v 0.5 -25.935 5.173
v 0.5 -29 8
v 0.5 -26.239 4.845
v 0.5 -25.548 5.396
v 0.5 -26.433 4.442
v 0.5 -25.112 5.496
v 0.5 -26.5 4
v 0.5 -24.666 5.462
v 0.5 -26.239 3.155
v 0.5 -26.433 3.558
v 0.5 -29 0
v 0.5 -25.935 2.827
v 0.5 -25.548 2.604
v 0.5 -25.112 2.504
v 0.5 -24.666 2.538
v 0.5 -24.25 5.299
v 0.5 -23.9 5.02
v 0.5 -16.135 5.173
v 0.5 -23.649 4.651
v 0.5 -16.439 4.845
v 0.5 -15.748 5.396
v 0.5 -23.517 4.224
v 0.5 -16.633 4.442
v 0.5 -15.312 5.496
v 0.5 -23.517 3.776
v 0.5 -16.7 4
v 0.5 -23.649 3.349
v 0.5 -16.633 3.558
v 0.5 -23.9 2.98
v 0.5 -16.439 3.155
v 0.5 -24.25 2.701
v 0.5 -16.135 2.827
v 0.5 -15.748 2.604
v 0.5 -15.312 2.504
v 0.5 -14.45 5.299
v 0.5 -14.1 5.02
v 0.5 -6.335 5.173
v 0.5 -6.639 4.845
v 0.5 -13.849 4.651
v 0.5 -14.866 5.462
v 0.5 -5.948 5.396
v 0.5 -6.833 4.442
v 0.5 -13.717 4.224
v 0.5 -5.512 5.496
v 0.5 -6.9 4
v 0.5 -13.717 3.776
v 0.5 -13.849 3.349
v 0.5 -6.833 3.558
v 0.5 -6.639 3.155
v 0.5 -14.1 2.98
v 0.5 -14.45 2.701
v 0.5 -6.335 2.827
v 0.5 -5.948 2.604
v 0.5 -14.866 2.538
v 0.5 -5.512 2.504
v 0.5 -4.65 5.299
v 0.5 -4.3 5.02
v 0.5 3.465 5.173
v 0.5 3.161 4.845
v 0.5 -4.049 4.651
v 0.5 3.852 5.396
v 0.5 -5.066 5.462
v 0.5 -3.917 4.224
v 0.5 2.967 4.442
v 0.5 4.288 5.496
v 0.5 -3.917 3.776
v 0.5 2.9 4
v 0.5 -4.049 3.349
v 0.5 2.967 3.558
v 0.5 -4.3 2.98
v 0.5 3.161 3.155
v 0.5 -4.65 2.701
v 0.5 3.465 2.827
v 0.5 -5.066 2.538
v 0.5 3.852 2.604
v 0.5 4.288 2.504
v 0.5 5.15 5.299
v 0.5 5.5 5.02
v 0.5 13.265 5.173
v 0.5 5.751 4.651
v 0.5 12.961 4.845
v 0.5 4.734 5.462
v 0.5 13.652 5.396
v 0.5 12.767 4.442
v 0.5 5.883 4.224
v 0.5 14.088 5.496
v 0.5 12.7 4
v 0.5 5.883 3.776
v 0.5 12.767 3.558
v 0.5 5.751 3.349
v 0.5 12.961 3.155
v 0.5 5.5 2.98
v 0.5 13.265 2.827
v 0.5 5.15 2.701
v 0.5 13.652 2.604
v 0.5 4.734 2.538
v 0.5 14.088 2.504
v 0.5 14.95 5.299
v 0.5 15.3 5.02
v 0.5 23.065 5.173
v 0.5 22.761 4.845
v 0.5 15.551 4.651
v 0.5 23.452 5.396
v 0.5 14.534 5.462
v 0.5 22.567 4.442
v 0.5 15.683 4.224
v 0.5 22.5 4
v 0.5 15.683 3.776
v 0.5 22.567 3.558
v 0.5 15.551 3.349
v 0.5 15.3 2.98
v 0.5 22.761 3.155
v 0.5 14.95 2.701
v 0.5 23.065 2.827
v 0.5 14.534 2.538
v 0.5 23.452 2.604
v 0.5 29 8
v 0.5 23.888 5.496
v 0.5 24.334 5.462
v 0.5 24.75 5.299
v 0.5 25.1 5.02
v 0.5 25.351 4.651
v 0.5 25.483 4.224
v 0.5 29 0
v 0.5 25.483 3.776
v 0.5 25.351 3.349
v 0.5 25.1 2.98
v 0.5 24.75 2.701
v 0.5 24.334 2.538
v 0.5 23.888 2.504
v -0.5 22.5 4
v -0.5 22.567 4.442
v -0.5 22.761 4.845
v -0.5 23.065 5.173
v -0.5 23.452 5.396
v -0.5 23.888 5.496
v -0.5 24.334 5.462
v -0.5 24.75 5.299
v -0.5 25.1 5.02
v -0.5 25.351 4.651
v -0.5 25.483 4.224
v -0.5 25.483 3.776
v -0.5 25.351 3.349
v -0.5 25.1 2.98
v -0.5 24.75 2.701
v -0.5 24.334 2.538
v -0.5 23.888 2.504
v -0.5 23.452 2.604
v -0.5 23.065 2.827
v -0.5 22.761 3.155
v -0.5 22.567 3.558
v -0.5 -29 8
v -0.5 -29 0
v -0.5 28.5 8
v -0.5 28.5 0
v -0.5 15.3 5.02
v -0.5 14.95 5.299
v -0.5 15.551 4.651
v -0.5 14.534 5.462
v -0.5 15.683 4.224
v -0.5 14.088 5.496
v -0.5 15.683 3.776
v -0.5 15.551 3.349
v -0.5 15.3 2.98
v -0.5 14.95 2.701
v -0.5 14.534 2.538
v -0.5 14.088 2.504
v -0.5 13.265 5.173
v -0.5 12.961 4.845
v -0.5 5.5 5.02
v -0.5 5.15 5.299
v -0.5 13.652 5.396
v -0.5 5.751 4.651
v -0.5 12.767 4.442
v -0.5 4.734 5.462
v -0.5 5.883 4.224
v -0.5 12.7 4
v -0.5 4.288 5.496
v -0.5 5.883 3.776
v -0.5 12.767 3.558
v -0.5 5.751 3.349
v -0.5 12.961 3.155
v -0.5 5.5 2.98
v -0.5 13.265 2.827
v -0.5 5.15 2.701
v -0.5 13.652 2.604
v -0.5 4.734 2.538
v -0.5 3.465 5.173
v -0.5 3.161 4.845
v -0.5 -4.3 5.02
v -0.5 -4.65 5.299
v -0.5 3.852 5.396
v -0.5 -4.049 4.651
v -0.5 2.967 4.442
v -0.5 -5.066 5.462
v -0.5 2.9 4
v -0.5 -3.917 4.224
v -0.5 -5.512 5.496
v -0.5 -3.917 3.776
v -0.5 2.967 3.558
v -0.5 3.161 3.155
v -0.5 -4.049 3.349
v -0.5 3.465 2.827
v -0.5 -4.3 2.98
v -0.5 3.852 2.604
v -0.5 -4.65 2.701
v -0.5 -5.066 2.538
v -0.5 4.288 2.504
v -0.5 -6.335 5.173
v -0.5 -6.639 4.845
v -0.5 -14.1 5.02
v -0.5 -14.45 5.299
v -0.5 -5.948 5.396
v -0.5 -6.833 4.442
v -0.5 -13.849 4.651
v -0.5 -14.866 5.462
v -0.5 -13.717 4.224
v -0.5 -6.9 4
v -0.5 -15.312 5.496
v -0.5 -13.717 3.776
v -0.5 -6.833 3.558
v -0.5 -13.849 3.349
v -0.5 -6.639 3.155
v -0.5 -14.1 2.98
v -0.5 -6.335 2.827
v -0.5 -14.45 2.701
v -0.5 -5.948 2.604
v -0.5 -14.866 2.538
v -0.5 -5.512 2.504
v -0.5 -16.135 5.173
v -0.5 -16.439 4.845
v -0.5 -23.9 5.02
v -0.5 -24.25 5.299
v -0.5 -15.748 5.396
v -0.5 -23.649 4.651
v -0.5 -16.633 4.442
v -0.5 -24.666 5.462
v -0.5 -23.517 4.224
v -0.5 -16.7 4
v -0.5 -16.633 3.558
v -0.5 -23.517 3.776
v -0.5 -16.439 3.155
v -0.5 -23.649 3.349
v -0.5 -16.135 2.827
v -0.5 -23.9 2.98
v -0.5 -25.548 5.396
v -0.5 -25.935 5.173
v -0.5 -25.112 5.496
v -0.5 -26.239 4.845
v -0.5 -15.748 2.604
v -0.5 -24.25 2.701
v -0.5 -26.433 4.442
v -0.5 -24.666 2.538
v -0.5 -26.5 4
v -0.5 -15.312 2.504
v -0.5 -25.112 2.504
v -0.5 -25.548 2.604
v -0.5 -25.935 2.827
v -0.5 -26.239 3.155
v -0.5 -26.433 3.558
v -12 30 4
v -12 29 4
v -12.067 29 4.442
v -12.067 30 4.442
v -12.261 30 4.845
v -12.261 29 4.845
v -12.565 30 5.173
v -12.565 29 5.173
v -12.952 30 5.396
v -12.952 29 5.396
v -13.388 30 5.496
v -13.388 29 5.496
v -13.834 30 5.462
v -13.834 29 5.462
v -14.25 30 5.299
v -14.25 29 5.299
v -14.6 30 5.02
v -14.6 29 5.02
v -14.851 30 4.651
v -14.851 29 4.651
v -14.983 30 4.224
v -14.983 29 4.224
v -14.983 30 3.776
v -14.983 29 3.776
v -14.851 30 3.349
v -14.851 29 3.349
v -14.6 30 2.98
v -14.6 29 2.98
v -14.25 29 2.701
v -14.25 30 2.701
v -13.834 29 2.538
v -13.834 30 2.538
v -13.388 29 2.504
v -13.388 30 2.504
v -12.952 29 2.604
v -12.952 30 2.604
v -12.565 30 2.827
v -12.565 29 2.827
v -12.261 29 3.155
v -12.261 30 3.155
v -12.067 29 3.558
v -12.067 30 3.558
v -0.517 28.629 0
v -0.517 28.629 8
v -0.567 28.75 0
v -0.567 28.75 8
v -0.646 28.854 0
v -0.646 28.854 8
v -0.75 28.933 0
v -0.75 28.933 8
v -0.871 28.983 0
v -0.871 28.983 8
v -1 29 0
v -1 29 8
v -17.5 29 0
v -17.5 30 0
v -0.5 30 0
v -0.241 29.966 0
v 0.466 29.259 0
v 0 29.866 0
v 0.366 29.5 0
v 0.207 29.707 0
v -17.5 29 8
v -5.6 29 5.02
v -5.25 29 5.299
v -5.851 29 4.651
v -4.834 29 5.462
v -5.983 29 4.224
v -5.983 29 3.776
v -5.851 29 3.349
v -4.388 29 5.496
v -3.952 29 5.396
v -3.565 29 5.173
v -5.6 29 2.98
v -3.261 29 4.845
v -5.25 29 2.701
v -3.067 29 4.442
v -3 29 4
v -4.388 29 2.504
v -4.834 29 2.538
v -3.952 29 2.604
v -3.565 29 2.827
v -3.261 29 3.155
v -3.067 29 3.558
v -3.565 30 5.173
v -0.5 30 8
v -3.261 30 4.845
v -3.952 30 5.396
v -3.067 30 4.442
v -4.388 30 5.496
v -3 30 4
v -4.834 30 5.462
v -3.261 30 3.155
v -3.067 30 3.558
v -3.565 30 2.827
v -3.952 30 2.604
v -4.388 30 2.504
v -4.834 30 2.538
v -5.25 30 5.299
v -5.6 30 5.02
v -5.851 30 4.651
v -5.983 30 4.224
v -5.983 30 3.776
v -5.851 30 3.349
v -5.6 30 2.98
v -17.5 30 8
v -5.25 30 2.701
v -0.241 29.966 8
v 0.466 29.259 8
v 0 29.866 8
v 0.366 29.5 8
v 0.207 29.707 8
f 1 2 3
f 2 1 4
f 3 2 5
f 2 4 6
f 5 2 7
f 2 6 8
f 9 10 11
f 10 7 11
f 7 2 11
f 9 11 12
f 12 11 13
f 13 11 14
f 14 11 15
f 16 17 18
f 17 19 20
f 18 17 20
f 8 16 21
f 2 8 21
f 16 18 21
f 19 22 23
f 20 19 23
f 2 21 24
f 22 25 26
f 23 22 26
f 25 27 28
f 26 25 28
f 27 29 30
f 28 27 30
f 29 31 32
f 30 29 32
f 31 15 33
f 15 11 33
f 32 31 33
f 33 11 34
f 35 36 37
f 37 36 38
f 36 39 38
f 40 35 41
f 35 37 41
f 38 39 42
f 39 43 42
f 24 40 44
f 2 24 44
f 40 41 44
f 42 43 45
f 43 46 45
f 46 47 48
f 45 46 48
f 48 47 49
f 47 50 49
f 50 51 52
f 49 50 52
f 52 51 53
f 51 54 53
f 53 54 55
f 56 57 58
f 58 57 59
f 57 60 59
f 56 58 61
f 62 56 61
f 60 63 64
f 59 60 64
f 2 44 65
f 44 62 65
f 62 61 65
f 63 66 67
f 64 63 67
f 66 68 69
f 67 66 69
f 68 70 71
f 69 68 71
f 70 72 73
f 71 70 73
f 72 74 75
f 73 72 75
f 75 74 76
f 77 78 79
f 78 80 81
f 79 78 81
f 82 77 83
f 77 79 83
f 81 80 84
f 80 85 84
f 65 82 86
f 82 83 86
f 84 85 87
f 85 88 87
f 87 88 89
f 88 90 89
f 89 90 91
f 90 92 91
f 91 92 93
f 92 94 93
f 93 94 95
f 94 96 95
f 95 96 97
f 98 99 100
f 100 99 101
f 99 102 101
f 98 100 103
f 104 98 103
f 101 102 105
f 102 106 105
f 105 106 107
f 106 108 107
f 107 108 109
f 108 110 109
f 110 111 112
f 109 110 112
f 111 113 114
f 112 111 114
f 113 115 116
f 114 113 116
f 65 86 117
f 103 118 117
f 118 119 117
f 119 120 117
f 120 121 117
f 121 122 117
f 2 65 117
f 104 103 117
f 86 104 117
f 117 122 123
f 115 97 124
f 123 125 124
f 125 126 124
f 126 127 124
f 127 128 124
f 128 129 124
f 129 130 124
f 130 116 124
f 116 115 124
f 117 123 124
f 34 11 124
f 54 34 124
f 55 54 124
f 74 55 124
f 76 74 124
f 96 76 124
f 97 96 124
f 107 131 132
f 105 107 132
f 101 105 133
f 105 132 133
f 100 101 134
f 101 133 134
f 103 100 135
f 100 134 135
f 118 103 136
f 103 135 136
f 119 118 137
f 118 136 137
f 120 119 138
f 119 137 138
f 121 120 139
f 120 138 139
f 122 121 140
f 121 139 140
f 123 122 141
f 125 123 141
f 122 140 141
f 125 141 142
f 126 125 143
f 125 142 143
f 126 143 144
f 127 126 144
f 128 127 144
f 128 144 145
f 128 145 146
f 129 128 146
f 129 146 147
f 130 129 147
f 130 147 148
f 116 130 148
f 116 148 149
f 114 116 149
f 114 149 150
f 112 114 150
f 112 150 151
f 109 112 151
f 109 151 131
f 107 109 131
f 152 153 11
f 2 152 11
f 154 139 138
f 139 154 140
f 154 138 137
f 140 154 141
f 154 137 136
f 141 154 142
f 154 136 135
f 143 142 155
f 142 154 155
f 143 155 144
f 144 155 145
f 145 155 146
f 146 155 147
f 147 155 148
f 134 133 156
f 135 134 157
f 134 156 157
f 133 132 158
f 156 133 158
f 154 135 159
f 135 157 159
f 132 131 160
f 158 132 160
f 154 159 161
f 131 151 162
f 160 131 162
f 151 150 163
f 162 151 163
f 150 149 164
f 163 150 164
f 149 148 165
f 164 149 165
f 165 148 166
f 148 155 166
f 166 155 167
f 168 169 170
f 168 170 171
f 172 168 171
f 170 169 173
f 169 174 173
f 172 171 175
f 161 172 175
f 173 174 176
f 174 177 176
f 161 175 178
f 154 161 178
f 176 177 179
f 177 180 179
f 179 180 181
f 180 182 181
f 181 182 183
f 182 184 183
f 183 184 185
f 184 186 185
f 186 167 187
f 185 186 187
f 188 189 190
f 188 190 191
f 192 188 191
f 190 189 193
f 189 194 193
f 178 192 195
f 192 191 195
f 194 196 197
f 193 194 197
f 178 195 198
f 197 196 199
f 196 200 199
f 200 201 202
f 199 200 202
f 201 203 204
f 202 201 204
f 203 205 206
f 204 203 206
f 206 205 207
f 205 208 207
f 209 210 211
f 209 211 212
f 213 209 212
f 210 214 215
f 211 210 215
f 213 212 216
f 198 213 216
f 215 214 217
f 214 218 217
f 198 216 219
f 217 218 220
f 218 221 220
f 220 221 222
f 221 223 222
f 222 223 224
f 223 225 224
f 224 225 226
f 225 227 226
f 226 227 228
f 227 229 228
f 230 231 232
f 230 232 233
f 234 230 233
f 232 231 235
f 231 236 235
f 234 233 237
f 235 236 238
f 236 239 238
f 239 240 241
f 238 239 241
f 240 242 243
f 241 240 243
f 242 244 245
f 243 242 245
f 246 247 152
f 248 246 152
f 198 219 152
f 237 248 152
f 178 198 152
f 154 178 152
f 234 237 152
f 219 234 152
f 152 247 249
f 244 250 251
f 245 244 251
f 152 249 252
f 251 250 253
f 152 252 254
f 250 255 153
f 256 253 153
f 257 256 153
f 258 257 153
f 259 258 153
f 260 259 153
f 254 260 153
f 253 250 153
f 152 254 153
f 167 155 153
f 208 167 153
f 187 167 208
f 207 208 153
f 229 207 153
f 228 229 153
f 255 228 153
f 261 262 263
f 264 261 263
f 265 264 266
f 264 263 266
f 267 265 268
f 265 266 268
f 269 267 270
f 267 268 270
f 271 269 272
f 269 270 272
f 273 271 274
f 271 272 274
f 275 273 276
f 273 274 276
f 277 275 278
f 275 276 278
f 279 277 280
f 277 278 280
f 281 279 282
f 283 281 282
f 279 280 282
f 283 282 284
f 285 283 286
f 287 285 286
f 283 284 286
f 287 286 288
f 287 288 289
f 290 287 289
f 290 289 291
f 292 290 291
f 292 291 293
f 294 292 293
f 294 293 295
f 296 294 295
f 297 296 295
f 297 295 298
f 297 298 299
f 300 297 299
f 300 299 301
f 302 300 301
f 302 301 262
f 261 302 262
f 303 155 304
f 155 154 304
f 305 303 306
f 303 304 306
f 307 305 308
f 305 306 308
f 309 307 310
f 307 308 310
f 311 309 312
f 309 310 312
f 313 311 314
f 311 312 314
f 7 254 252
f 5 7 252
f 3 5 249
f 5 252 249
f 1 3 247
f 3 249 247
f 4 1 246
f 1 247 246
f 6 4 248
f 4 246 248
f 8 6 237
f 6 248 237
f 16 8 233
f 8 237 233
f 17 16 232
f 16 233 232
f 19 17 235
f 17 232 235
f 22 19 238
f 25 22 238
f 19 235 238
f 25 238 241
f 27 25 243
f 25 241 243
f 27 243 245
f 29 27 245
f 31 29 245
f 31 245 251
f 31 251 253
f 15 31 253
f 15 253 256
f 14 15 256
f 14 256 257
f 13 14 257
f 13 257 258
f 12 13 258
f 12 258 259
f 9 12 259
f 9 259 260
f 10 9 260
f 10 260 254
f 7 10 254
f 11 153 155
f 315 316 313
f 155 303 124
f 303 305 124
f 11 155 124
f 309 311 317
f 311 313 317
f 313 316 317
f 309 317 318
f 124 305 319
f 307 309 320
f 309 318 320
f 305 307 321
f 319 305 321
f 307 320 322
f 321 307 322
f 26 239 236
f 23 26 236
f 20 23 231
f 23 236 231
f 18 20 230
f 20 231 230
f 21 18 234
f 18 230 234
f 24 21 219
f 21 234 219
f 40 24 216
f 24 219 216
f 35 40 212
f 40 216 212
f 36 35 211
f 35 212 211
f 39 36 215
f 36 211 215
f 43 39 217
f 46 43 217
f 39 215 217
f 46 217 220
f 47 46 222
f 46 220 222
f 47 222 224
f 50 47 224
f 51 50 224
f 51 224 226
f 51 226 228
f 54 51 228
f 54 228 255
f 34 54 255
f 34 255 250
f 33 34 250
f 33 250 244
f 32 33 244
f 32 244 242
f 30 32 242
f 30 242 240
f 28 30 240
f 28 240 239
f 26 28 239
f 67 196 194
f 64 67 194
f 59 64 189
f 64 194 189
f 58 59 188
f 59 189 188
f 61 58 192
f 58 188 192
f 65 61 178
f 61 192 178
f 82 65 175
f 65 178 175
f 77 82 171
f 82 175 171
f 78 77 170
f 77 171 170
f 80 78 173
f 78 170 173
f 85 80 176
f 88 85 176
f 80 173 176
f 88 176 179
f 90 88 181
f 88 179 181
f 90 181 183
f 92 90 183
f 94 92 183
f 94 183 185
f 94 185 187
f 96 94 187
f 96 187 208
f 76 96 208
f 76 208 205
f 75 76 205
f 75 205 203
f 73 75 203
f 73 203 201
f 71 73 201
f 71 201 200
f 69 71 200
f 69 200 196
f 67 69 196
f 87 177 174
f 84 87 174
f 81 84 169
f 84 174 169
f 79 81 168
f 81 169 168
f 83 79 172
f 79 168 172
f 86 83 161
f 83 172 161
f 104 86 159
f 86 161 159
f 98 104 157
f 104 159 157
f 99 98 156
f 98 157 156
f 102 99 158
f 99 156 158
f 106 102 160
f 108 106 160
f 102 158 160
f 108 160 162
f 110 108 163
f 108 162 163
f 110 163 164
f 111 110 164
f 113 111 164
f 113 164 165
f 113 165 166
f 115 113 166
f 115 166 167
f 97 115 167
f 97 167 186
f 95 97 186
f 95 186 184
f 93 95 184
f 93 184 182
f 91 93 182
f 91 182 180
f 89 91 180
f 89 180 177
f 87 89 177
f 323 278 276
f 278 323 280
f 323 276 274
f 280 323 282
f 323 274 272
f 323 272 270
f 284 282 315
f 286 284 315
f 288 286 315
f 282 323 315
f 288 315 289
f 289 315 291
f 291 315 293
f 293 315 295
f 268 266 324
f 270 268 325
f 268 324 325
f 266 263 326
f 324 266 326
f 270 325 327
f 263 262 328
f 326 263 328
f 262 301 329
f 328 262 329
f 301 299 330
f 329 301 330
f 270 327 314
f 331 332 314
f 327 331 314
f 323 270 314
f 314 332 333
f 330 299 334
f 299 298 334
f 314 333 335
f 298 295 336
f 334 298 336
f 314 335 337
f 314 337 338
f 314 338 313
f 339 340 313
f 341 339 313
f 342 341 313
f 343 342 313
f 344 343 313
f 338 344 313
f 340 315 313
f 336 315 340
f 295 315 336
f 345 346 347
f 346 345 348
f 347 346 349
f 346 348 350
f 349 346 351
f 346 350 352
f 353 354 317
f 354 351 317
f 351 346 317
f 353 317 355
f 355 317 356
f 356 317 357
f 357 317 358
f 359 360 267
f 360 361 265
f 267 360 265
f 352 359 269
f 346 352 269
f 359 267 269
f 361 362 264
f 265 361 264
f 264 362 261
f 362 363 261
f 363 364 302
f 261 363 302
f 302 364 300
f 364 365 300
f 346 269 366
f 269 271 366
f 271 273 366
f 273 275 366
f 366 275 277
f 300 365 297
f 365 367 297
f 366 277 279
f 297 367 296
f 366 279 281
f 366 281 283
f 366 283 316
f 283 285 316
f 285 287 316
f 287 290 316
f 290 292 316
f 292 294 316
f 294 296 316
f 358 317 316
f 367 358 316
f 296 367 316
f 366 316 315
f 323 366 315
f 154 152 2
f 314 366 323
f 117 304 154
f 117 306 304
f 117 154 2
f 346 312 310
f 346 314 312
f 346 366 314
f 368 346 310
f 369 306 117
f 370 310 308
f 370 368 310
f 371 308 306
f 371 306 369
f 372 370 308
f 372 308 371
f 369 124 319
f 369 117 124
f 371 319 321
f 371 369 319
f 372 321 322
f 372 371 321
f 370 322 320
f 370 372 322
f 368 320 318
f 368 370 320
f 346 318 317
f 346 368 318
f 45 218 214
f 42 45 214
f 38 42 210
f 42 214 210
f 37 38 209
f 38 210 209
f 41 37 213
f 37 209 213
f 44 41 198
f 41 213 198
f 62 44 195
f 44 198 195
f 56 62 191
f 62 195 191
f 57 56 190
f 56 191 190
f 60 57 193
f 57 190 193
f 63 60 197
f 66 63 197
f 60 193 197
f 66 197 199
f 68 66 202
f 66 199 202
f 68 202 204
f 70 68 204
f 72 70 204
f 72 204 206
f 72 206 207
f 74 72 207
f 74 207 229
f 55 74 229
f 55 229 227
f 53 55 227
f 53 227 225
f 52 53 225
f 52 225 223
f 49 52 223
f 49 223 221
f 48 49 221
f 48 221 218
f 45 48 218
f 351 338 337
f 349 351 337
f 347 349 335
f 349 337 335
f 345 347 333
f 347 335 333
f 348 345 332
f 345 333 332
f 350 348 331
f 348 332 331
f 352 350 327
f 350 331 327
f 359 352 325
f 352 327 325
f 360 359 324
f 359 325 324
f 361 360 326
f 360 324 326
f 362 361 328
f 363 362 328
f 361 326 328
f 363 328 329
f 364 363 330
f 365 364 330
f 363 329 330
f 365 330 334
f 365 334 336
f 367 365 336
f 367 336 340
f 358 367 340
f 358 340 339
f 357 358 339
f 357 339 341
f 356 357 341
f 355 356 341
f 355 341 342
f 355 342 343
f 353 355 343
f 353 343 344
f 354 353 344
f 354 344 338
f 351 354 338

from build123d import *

# Parameters (mm, degrees)
F1_DEPTH = 8
F2_R     = 1.5
F3_DEPTH = 25
F4_R     = 1.5
F5_DEPTH = 25
F6_R     = 1
F7_R     = 0.5


with BuildPart() as f1:
    # F0 (on Top) → F1 (new body)
    with BuildSketch(Plane.XY):
        Polygon((-0.5, 29), (-0.5, -29), (0.5, -29), (0.5, 29), (0.5, 30), (-17.5, 30), (-17.5, 29), align=None)
    extrude(amount=F1_DEPTH)

    # F2 (on face) → F3 (cut)
    with BuildSketch(Plane(origin=(-0.5, 0, 0), x_dir=(0, -1, 0), z_dir=(-1, 0, 0))):
        with Locations((25, 4)):
            Circle(F2_R)
        with Locations((15.2, 4)):
            Circle(F2_R)
        with Locations((5.4, 4)):
            Circle(F2_R)
        with Locations((-4.4, 4)):
            Circle(F2_R)
        with Locations((-14.2, 4)):
            Circle(F2_R)
        with Locations((-24, 4)):
            Circle(F2_R)
    extrude(amount=-F3_DEPTH, mode=Mode.SUBTRACT)

    # F4 (on face) → F5 (cut)
    with BuildSketch(Plane.XZ.offset(-29)):
        with Locations((-4.5, 4)):
            Circle(F4_R)
        with Locations((-13.5, 4)):
            Circle(F4_R)
    extrude(amount=-F5_DEPTH, mode=Mode.SUBTRACT)

    # F6
    f6_edges = [f1.edges().sort_by_distance(p)[0] for p in [
        (0.5, 30, 4),
    ]]
    fillet(f6_edges, radius=F6_R)

    # F7
    f7_edges = [f1.edges().sort_by_distance(p)[0] for p in [
        (-0.5, 29, 4),
    ]]
    fillet(f7_edges, radius=F7_R)


solid = f1.part
